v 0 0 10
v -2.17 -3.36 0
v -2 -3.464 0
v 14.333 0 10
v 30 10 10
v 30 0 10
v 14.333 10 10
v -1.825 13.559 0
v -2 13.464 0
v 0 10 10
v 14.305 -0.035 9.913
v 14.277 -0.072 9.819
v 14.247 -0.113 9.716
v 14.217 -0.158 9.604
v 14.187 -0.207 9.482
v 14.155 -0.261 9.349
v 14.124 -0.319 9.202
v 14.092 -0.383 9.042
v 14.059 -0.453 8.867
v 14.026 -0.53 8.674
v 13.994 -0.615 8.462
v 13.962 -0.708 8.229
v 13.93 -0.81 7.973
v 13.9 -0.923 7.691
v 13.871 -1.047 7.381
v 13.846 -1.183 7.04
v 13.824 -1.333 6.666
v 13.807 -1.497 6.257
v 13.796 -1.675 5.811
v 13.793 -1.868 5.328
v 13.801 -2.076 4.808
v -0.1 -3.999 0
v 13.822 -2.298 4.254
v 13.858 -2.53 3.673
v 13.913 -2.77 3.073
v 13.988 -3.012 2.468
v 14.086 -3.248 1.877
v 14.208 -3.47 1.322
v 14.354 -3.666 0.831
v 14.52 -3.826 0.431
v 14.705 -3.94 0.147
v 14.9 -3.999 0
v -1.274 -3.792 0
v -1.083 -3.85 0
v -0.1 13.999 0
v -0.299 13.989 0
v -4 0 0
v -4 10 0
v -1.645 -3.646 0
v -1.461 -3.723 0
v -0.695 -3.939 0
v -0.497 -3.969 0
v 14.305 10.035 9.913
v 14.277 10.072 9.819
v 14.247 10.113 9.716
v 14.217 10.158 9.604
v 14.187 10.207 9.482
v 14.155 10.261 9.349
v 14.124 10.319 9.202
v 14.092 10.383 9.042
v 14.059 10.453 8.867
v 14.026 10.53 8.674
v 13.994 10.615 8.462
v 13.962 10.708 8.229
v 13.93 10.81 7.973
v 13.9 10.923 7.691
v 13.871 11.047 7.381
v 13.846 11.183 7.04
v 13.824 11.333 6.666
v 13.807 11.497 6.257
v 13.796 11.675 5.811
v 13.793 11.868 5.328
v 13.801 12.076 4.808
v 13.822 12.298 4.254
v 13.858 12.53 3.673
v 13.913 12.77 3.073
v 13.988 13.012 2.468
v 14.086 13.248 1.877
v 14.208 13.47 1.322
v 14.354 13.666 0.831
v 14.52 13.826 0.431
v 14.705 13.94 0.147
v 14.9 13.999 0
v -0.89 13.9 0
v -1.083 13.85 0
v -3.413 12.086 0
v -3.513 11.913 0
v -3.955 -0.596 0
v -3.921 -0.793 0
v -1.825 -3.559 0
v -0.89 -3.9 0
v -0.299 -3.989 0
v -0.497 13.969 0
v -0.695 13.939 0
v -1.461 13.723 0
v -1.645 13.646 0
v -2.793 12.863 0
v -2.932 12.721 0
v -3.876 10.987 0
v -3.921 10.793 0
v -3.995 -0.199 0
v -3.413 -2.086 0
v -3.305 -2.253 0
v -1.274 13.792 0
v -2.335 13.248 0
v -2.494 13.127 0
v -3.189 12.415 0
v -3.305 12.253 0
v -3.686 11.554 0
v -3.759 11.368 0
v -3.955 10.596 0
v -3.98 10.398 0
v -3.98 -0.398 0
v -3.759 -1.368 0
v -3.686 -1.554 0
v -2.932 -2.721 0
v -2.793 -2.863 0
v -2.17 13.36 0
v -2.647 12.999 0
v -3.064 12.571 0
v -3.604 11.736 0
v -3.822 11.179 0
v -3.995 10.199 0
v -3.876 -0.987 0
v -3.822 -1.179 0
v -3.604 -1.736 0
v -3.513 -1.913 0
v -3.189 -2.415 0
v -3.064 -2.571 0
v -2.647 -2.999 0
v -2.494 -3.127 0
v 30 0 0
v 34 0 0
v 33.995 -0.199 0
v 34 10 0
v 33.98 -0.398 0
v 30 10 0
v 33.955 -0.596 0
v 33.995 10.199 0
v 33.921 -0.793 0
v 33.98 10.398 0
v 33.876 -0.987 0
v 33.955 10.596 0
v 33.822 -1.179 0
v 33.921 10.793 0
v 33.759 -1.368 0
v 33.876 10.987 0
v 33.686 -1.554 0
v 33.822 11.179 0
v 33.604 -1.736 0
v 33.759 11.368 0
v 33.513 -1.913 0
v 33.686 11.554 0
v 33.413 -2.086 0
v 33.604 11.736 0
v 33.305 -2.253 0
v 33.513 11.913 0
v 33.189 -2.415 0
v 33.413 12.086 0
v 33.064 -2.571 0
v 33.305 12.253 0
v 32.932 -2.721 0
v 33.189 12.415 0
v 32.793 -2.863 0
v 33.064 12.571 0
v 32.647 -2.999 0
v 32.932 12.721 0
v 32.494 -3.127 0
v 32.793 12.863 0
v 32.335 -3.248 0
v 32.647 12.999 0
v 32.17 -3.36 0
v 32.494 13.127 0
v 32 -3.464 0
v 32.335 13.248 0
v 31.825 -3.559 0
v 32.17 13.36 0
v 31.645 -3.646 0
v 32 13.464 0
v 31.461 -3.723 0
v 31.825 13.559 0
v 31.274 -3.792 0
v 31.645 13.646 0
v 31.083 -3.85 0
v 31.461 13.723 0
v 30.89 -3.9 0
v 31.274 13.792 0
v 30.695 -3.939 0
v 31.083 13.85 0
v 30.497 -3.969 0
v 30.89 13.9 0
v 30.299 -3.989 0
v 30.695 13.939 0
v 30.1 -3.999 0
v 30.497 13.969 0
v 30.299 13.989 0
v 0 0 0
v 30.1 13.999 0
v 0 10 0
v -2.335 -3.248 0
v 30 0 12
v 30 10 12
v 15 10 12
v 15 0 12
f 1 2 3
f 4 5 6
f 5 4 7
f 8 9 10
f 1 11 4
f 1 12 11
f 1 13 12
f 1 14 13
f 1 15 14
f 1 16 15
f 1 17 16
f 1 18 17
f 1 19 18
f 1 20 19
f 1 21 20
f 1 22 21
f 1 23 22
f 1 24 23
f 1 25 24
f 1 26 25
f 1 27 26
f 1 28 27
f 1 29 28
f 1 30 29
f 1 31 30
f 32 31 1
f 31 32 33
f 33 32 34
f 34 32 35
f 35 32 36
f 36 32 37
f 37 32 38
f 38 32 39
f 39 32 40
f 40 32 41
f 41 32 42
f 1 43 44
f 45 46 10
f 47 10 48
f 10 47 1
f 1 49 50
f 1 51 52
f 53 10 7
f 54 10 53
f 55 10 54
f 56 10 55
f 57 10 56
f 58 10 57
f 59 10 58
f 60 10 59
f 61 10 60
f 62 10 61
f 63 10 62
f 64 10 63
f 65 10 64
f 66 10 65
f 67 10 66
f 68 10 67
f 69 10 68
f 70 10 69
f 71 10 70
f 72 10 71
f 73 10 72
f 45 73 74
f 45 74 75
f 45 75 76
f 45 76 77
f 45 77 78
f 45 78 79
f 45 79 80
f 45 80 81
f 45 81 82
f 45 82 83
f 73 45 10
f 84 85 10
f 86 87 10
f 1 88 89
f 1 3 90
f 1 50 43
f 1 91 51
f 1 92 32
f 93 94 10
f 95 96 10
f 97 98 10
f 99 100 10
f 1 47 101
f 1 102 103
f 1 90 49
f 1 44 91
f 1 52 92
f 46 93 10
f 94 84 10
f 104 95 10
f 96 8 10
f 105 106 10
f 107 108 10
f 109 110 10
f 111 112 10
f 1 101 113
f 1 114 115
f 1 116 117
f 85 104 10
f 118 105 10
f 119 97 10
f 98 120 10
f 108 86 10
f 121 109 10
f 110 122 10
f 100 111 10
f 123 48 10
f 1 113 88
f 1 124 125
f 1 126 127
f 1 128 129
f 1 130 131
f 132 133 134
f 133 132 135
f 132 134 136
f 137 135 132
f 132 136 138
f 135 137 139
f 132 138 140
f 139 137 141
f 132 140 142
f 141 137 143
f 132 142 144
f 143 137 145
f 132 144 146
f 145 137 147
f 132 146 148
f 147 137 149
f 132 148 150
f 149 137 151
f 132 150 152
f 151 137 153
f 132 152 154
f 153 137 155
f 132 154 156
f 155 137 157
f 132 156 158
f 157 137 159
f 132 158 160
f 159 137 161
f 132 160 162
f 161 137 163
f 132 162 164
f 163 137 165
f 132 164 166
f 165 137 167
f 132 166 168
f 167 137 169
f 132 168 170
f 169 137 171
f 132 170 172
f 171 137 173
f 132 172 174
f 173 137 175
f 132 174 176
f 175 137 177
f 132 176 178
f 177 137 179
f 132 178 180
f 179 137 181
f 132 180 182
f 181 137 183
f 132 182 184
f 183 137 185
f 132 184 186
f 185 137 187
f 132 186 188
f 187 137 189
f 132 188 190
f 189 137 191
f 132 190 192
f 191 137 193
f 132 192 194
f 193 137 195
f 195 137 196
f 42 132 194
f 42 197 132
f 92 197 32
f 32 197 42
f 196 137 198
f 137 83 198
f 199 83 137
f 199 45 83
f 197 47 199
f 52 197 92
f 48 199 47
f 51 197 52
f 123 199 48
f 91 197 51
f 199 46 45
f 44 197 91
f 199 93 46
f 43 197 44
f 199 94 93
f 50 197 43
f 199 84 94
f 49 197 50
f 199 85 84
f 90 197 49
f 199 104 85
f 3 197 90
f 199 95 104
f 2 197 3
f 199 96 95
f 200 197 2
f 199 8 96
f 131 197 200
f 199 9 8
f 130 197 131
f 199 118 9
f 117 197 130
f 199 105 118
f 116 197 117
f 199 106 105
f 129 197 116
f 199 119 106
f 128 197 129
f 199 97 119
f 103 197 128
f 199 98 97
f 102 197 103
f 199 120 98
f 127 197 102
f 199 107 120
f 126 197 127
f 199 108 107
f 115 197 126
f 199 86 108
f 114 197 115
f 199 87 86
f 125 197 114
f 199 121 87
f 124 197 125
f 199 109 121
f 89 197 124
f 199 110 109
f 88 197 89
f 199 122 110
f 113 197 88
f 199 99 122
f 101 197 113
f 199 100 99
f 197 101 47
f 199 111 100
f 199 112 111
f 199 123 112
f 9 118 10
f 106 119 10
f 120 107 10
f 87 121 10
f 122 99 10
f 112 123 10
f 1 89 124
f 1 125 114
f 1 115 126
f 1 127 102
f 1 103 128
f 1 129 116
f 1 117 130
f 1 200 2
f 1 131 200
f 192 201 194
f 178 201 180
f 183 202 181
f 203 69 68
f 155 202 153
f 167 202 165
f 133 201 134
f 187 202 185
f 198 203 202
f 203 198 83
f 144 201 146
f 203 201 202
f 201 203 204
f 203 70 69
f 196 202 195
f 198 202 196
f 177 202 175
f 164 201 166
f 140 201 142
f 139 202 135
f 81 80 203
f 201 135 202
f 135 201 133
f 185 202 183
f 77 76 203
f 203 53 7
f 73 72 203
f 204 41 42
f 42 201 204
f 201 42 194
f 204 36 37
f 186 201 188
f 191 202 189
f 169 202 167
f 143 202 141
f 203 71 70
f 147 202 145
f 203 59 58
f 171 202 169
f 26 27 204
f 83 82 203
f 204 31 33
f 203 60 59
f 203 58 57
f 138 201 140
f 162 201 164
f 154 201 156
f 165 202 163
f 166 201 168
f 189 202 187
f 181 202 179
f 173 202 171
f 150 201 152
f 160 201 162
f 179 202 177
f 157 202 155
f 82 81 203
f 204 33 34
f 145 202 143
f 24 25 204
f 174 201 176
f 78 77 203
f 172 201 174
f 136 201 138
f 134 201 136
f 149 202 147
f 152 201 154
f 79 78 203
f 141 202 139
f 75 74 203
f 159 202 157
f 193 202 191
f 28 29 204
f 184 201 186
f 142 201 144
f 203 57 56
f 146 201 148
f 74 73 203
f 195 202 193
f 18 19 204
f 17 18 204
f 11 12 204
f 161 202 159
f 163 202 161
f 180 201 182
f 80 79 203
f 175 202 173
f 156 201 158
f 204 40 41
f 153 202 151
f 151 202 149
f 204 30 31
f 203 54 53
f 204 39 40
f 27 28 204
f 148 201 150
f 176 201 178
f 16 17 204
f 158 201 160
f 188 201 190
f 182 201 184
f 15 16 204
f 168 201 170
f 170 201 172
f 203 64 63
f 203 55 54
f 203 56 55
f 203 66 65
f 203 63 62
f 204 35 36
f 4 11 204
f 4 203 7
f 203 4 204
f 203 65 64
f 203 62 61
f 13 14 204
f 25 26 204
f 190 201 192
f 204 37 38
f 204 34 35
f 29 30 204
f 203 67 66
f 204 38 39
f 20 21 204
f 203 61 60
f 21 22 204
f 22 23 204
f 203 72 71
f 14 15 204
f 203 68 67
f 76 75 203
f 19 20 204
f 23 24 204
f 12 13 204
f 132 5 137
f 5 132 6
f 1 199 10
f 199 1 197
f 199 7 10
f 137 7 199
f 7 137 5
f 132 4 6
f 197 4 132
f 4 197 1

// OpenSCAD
$fs = 0.2;
$fa = 1;

difference() {
	union() {
		minkowski() {
			scale([1, 1, 0]) {
				cube([30, 10, 10]);
			}
			cylinder(r1=4, r2=0, h=10);
		}
		minkowski() {
			translate([15, 0, 0]) {
				scale([1, 1, 0]) {
					cube([15, 10, 2]);
				}
			}
			cylinder(r1=4, r2=0, h=12);
		}
	}
	cube([30, 10, 10]);
}
